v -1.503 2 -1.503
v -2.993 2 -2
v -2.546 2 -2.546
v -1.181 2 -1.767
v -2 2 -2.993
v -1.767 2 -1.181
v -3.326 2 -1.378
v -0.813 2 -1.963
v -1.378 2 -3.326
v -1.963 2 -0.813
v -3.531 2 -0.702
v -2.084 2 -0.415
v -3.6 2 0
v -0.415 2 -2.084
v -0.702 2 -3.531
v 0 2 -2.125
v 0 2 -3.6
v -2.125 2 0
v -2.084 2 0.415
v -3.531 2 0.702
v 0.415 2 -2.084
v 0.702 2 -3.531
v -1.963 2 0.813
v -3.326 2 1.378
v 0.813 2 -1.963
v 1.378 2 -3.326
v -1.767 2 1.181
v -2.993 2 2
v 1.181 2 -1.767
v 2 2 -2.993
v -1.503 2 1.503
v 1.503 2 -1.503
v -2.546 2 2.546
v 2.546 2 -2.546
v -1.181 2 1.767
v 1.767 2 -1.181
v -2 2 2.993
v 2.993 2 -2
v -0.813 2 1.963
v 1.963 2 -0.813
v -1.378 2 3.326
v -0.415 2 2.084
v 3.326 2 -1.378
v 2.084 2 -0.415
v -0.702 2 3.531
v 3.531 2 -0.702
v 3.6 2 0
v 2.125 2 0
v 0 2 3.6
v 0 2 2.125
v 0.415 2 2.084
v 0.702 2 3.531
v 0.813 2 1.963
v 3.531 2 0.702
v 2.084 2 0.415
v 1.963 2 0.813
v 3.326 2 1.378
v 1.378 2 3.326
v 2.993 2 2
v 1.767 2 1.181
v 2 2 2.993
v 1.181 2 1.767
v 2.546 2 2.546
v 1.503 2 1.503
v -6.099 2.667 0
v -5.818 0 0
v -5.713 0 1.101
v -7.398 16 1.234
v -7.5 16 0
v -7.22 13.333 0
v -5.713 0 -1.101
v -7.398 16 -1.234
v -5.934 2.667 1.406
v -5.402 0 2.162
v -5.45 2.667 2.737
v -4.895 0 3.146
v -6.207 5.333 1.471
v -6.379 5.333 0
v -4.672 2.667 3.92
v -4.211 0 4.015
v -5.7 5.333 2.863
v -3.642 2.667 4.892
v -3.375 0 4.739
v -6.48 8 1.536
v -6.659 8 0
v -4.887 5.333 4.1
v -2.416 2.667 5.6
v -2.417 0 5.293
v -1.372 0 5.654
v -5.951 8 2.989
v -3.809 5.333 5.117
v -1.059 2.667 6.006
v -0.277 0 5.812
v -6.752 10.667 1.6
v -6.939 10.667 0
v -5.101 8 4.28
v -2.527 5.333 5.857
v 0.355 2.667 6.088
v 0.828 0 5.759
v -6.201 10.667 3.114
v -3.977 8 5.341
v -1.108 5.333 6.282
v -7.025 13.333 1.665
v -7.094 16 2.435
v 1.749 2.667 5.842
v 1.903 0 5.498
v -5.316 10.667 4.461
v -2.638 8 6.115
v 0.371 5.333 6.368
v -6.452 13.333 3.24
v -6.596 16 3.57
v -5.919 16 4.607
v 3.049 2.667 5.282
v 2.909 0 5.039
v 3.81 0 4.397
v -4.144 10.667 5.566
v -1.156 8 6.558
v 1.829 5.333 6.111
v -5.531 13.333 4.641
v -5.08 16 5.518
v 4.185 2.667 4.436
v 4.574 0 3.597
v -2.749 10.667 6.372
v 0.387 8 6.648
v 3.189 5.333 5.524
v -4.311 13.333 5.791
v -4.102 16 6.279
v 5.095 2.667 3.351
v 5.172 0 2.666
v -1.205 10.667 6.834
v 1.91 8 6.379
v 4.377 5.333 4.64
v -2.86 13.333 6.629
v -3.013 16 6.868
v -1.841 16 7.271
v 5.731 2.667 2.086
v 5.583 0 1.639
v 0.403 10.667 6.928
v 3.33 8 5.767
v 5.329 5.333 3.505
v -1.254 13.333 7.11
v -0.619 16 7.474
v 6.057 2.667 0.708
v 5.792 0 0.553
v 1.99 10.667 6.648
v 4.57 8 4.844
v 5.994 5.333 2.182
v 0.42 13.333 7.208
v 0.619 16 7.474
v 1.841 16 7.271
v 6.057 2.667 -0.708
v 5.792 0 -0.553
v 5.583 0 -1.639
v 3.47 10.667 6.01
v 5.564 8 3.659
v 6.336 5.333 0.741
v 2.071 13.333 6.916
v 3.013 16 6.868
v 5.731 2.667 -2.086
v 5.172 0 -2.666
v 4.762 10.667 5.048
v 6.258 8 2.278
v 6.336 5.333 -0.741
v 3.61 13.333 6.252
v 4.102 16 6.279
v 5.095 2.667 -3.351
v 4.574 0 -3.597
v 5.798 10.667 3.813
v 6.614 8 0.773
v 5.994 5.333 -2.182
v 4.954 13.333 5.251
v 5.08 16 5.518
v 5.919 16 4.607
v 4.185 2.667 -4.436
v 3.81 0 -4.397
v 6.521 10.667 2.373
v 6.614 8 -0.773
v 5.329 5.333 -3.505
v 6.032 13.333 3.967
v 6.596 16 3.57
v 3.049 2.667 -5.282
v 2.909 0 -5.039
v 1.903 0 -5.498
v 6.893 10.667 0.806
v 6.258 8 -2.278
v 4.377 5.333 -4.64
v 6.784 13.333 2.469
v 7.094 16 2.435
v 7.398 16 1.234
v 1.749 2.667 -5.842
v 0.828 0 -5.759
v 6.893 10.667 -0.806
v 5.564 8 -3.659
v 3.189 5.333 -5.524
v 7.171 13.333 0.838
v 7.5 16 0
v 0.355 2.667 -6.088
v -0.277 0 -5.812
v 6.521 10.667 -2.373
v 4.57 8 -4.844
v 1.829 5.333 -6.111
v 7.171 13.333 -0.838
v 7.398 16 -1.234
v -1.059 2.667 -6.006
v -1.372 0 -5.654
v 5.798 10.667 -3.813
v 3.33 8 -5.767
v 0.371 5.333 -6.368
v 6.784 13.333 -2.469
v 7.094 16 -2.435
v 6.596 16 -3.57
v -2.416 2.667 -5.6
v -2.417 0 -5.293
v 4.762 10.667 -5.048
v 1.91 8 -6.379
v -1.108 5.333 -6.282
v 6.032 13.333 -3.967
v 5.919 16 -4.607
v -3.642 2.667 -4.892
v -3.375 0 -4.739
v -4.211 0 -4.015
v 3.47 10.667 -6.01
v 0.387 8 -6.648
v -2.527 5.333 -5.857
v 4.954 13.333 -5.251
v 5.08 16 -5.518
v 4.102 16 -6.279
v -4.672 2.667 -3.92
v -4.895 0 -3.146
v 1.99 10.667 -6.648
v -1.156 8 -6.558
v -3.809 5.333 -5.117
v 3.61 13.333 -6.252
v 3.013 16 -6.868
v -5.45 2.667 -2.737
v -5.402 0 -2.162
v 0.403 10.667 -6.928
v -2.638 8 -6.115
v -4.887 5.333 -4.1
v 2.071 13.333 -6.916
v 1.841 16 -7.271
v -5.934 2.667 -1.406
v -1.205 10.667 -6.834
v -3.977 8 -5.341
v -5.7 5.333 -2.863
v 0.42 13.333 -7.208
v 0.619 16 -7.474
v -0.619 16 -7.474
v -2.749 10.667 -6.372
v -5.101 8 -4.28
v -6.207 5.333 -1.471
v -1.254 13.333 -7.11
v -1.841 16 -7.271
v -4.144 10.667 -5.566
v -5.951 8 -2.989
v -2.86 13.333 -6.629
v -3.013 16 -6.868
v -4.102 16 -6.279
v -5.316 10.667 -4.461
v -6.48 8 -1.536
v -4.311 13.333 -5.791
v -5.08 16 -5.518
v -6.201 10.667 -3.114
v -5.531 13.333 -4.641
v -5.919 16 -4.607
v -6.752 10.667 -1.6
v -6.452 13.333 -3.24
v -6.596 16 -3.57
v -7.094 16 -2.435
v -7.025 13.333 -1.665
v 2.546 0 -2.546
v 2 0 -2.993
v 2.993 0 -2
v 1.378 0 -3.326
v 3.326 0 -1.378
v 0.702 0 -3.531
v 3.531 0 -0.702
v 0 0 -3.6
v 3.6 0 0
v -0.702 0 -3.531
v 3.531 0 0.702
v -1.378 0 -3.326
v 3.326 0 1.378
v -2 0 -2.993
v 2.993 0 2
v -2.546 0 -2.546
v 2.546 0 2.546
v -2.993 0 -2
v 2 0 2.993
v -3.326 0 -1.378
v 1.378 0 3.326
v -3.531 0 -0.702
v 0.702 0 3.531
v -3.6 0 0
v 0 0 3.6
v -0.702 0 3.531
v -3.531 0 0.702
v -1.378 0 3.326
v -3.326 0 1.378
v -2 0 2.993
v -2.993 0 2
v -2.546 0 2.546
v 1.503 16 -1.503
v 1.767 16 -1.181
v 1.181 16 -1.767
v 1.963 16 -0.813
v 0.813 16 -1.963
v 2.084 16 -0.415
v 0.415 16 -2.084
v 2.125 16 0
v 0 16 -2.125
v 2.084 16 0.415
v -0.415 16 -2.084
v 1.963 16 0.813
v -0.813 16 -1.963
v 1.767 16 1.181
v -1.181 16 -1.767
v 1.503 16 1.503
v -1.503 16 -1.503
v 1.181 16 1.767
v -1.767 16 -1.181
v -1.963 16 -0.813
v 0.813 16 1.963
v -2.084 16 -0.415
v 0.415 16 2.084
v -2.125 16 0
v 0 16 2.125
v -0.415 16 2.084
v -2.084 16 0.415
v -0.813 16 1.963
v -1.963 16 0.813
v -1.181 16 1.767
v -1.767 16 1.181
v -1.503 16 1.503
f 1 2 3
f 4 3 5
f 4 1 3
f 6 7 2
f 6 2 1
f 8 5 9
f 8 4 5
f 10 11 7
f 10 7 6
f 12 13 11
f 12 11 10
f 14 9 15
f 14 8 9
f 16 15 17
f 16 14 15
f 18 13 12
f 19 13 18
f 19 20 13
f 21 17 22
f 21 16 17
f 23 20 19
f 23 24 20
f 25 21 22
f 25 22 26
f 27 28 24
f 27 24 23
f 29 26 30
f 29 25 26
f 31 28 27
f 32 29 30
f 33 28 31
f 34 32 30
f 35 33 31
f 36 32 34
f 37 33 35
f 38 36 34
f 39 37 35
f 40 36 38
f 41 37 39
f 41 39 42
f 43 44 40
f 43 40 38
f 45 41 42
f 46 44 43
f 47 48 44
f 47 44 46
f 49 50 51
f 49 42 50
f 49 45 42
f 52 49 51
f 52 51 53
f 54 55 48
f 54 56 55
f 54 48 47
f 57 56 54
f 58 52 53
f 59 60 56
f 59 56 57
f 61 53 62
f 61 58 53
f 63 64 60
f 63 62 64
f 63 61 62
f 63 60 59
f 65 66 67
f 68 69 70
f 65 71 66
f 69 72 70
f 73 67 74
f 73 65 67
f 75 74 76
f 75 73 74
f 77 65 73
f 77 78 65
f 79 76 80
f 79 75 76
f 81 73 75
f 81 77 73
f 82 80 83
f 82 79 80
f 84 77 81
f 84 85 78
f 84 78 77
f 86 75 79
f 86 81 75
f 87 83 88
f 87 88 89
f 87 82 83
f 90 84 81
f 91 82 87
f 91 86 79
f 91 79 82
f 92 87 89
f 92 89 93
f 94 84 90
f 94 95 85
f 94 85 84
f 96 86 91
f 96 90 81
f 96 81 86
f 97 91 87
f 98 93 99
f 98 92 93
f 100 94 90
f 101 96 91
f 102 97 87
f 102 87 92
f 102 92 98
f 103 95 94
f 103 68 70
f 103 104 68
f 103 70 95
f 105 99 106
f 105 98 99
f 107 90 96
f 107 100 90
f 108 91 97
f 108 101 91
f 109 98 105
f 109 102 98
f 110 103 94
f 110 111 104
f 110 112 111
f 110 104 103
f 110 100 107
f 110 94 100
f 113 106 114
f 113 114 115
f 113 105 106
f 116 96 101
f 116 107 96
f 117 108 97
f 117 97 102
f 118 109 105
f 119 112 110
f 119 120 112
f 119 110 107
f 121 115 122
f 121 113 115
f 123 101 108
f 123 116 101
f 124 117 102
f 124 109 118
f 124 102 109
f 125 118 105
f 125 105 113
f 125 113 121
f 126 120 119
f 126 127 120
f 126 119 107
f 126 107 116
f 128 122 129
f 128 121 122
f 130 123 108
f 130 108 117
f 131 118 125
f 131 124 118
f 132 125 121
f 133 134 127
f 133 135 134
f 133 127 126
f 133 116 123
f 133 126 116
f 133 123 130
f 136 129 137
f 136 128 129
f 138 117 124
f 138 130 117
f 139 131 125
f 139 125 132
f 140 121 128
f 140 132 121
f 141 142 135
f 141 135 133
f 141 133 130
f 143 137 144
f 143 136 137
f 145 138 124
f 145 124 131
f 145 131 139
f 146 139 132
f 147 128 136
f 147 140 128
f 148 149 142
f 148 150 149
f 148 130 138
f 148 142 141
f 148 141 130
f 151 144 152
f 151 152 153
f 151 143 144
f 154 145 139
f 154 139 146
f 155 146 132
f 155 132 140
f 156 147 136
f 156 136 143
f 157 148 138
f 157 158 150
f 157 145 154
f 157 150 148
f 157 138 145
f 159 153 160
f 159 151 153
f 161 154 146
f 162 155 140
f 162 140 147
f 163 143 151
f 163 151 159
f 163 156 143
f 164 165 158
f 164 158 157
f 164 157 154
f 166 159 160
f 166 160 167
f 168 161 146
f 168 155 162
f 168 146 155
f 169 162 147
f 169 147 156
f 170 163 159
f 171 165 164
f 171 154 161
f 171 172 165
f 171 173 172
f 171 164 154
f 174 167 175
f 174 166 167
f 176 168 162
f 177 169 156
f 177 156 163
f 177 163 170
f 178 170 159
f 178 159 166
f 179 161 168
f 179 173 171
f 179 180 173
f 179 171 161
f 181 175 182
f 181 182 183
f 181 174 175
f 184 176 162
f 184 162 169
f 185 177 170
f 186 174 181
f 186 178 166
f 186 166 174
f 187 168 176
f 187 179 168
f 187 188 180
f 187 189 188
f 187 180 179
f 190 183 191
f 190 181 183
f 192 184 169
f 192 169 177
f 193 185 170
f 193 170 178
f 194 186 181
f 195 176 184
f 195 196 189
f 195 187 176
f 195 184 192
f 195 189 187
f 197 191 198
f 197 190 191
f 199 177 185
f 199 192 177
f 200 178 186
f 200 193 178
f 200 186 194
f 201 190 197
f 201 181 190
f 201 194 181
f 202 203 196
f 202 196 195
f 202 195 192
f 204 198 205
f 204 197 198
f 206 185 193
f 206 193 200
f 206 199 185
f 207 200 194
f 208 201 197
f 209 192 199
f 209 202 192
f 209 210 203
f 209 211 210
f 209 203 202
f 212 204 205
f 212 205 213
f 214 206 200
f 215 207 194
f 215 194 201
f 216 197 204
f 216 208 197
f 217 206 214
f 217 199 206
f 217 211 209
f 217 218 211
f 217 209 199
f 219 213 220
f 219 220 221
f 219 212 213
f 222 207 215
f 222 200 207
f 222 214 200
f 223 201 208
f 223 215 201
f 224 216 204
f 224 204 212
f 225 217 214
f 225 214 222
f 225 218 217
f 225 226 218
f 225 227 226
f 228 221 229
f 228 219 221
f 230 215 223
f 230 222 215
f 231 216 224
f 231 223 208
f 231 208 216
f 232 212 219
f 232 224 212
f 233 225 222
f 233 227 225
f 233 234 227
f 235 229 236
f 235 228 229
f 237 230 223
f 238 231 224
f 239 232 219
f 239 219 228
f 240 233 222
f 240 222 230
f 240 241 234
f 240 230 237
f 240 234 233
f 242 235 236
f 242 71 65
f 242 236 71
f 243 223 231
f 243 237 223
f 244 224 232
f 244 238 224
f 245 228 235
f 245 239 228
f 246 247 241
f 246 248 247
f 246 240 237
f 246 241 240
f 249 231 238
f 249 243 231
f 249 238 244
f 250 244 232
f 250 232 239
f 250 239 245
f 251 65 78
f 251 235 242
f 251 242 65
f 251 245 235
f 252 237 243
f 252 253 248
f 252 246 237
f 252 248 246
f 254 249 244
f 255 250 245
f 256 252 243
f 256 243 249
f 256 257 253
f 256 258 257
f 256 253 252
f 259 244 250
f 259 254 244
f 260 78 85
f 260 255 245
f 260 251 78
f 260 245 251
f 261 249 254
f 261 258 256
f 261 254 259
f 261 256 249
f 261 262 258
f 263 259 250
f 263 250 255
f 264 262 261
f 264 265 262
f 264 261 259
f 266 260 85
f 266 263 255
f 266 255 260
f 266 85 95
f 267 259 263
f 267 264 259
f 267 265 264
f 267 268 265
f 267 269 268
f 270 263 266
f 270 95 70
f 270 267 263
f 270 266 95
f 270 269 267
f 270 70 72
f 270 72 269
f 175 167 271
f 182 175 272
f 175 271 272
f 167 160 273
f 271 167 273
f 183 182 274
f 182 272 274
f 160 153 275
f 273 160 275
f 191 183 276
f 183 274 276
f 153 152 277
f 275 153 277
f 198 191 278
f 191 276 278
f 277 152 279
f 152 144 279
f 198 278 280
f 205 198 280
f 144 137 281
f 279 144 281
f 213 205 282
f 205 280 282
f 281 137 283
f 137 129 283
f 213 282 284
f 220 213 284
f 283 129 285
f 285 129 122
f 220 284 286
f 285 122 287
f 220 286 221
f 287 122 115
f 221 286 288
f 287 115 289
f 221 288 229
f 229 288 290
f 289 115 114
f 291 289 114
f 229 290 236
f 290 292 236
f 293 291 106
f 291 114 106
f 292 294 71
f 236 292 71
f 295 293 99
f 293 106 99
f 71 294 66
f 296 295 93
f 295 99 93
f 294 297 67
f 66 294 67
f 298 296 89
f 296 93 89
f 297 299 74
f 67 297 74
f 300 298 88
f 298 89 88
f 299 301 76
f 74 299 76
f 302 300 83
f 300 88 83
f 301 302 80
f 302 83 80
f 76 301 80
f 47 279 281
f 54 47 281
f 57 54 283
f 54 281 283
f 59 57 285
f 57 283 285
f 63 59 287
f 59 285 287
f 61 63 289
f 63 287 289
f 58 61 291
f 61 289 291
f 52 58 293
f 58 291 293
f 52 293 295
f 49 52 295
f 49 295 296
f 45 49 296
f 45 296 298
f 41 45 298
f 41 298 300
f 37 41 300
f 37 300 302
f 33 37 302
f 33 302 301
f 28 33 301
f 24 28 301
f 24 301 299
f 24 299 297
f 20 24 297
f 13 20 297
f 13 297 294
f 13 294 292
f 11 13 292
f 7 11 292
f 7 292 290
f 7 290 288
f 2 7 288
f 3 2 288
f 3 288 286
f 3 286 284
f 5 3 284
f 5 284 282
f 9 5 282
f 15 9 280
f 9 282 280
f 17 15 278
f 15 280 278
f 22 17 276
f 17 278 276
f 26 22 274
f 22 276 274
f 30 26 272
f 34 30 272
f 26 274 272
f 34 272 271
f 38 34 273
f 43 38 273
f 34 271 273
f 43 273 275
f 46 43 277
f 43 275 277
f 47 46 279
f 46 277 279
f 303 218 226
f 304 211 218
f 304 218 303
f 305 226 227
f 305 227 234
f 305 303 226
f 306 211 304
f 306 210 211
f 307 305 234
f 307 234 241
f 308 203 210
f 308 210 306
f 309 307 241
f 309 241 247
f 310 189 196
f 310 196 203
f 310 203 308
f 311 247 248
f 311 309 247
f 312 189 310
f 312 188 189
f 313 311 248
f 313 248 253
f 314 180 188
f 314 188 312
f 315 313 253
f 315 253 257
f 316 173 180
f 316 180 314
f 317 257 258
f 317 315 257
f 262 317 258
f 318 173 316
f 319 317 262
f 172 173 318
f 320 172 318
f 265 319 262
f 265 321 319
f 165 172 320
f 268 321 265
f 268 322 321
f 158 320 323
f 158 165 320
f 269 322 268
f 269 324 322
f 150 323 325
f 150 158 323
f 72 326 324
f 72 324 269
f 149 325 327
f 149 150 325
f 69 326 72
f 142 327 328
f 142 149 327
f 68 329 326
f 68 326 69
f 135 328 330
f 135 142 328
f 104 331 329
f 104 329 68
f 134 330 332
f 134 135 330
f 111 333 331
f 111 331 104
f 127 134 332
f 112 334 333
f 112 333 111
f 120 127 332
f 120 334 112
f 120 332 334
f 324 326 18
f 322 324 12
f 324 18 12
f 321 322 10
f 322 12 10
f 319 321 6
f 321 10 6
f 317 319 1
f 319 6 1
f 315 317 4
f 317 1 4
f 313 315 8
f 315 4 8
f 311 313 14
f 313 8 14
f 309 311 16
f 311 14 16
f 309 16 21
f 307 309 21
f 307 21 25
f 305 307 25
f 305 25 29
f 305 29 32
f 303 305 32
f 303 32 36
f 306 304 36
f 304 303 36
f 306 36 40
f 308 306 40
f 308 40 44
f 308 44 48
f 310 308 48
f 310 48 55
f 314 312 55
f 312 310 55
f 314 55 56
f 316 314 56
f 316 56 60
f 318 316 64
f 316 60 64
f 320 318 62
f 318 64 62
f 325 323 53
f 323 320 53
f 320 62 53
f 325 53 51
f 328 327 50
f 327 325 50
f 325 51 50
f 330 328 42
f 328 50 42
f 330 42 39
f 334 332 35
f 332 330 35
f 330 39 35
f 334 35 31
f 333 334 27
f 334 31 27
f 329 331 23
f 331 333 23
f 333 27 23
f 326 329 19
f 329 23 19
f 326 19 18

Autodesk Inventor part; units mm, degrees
ref_plane "YZ Plane" through (0, 0, 0) normal (1, 0, 0) x (0, 1, 0)
ref_plane "XZ Plane" through (0, 0, 0) normal (0, 1, 0) x (-1, 0, 0)
ref_plane "XY Plane" through (0, 0, 0) normal (0, 0, 1) x (1, 0, 0)
sketch "Esquisse3" plane through (0, 0, 0) normal (0, 1, 0) x (-1, 0, 0)
  circle A0 centre (0, 0) radius 2.125
  circle A1 centre (0, 0) radius 7.5
  dimension "d12" = 4.25
  dimension "d13" = 15
extrude "Extrusion3" add sketch "Esquisse3" along normal blind 16
draft "Dépouille de face1" angle 6 pull direction (0, -1, 0) faces at (-7.4757, 10.6667, -0.6035) fixed edges at (7.5, 16, 0)
sketch "Esquisse4" plane through (0, 16, 0) normal (0, 1, 0) x (1, 0, 0)
  point P0 (0, 0)
sketch "Esquisse6" plane through (0, 0, 0) normal (0, -1, 0) x (1, 0, 0)
  circle A0 centre (0, 0) radius 3.6
  dimension "d22" = 7.2
extrude "Extrusion5" cut sketch "Esquisse6" against normal blind 2
properties part number "cleat"
